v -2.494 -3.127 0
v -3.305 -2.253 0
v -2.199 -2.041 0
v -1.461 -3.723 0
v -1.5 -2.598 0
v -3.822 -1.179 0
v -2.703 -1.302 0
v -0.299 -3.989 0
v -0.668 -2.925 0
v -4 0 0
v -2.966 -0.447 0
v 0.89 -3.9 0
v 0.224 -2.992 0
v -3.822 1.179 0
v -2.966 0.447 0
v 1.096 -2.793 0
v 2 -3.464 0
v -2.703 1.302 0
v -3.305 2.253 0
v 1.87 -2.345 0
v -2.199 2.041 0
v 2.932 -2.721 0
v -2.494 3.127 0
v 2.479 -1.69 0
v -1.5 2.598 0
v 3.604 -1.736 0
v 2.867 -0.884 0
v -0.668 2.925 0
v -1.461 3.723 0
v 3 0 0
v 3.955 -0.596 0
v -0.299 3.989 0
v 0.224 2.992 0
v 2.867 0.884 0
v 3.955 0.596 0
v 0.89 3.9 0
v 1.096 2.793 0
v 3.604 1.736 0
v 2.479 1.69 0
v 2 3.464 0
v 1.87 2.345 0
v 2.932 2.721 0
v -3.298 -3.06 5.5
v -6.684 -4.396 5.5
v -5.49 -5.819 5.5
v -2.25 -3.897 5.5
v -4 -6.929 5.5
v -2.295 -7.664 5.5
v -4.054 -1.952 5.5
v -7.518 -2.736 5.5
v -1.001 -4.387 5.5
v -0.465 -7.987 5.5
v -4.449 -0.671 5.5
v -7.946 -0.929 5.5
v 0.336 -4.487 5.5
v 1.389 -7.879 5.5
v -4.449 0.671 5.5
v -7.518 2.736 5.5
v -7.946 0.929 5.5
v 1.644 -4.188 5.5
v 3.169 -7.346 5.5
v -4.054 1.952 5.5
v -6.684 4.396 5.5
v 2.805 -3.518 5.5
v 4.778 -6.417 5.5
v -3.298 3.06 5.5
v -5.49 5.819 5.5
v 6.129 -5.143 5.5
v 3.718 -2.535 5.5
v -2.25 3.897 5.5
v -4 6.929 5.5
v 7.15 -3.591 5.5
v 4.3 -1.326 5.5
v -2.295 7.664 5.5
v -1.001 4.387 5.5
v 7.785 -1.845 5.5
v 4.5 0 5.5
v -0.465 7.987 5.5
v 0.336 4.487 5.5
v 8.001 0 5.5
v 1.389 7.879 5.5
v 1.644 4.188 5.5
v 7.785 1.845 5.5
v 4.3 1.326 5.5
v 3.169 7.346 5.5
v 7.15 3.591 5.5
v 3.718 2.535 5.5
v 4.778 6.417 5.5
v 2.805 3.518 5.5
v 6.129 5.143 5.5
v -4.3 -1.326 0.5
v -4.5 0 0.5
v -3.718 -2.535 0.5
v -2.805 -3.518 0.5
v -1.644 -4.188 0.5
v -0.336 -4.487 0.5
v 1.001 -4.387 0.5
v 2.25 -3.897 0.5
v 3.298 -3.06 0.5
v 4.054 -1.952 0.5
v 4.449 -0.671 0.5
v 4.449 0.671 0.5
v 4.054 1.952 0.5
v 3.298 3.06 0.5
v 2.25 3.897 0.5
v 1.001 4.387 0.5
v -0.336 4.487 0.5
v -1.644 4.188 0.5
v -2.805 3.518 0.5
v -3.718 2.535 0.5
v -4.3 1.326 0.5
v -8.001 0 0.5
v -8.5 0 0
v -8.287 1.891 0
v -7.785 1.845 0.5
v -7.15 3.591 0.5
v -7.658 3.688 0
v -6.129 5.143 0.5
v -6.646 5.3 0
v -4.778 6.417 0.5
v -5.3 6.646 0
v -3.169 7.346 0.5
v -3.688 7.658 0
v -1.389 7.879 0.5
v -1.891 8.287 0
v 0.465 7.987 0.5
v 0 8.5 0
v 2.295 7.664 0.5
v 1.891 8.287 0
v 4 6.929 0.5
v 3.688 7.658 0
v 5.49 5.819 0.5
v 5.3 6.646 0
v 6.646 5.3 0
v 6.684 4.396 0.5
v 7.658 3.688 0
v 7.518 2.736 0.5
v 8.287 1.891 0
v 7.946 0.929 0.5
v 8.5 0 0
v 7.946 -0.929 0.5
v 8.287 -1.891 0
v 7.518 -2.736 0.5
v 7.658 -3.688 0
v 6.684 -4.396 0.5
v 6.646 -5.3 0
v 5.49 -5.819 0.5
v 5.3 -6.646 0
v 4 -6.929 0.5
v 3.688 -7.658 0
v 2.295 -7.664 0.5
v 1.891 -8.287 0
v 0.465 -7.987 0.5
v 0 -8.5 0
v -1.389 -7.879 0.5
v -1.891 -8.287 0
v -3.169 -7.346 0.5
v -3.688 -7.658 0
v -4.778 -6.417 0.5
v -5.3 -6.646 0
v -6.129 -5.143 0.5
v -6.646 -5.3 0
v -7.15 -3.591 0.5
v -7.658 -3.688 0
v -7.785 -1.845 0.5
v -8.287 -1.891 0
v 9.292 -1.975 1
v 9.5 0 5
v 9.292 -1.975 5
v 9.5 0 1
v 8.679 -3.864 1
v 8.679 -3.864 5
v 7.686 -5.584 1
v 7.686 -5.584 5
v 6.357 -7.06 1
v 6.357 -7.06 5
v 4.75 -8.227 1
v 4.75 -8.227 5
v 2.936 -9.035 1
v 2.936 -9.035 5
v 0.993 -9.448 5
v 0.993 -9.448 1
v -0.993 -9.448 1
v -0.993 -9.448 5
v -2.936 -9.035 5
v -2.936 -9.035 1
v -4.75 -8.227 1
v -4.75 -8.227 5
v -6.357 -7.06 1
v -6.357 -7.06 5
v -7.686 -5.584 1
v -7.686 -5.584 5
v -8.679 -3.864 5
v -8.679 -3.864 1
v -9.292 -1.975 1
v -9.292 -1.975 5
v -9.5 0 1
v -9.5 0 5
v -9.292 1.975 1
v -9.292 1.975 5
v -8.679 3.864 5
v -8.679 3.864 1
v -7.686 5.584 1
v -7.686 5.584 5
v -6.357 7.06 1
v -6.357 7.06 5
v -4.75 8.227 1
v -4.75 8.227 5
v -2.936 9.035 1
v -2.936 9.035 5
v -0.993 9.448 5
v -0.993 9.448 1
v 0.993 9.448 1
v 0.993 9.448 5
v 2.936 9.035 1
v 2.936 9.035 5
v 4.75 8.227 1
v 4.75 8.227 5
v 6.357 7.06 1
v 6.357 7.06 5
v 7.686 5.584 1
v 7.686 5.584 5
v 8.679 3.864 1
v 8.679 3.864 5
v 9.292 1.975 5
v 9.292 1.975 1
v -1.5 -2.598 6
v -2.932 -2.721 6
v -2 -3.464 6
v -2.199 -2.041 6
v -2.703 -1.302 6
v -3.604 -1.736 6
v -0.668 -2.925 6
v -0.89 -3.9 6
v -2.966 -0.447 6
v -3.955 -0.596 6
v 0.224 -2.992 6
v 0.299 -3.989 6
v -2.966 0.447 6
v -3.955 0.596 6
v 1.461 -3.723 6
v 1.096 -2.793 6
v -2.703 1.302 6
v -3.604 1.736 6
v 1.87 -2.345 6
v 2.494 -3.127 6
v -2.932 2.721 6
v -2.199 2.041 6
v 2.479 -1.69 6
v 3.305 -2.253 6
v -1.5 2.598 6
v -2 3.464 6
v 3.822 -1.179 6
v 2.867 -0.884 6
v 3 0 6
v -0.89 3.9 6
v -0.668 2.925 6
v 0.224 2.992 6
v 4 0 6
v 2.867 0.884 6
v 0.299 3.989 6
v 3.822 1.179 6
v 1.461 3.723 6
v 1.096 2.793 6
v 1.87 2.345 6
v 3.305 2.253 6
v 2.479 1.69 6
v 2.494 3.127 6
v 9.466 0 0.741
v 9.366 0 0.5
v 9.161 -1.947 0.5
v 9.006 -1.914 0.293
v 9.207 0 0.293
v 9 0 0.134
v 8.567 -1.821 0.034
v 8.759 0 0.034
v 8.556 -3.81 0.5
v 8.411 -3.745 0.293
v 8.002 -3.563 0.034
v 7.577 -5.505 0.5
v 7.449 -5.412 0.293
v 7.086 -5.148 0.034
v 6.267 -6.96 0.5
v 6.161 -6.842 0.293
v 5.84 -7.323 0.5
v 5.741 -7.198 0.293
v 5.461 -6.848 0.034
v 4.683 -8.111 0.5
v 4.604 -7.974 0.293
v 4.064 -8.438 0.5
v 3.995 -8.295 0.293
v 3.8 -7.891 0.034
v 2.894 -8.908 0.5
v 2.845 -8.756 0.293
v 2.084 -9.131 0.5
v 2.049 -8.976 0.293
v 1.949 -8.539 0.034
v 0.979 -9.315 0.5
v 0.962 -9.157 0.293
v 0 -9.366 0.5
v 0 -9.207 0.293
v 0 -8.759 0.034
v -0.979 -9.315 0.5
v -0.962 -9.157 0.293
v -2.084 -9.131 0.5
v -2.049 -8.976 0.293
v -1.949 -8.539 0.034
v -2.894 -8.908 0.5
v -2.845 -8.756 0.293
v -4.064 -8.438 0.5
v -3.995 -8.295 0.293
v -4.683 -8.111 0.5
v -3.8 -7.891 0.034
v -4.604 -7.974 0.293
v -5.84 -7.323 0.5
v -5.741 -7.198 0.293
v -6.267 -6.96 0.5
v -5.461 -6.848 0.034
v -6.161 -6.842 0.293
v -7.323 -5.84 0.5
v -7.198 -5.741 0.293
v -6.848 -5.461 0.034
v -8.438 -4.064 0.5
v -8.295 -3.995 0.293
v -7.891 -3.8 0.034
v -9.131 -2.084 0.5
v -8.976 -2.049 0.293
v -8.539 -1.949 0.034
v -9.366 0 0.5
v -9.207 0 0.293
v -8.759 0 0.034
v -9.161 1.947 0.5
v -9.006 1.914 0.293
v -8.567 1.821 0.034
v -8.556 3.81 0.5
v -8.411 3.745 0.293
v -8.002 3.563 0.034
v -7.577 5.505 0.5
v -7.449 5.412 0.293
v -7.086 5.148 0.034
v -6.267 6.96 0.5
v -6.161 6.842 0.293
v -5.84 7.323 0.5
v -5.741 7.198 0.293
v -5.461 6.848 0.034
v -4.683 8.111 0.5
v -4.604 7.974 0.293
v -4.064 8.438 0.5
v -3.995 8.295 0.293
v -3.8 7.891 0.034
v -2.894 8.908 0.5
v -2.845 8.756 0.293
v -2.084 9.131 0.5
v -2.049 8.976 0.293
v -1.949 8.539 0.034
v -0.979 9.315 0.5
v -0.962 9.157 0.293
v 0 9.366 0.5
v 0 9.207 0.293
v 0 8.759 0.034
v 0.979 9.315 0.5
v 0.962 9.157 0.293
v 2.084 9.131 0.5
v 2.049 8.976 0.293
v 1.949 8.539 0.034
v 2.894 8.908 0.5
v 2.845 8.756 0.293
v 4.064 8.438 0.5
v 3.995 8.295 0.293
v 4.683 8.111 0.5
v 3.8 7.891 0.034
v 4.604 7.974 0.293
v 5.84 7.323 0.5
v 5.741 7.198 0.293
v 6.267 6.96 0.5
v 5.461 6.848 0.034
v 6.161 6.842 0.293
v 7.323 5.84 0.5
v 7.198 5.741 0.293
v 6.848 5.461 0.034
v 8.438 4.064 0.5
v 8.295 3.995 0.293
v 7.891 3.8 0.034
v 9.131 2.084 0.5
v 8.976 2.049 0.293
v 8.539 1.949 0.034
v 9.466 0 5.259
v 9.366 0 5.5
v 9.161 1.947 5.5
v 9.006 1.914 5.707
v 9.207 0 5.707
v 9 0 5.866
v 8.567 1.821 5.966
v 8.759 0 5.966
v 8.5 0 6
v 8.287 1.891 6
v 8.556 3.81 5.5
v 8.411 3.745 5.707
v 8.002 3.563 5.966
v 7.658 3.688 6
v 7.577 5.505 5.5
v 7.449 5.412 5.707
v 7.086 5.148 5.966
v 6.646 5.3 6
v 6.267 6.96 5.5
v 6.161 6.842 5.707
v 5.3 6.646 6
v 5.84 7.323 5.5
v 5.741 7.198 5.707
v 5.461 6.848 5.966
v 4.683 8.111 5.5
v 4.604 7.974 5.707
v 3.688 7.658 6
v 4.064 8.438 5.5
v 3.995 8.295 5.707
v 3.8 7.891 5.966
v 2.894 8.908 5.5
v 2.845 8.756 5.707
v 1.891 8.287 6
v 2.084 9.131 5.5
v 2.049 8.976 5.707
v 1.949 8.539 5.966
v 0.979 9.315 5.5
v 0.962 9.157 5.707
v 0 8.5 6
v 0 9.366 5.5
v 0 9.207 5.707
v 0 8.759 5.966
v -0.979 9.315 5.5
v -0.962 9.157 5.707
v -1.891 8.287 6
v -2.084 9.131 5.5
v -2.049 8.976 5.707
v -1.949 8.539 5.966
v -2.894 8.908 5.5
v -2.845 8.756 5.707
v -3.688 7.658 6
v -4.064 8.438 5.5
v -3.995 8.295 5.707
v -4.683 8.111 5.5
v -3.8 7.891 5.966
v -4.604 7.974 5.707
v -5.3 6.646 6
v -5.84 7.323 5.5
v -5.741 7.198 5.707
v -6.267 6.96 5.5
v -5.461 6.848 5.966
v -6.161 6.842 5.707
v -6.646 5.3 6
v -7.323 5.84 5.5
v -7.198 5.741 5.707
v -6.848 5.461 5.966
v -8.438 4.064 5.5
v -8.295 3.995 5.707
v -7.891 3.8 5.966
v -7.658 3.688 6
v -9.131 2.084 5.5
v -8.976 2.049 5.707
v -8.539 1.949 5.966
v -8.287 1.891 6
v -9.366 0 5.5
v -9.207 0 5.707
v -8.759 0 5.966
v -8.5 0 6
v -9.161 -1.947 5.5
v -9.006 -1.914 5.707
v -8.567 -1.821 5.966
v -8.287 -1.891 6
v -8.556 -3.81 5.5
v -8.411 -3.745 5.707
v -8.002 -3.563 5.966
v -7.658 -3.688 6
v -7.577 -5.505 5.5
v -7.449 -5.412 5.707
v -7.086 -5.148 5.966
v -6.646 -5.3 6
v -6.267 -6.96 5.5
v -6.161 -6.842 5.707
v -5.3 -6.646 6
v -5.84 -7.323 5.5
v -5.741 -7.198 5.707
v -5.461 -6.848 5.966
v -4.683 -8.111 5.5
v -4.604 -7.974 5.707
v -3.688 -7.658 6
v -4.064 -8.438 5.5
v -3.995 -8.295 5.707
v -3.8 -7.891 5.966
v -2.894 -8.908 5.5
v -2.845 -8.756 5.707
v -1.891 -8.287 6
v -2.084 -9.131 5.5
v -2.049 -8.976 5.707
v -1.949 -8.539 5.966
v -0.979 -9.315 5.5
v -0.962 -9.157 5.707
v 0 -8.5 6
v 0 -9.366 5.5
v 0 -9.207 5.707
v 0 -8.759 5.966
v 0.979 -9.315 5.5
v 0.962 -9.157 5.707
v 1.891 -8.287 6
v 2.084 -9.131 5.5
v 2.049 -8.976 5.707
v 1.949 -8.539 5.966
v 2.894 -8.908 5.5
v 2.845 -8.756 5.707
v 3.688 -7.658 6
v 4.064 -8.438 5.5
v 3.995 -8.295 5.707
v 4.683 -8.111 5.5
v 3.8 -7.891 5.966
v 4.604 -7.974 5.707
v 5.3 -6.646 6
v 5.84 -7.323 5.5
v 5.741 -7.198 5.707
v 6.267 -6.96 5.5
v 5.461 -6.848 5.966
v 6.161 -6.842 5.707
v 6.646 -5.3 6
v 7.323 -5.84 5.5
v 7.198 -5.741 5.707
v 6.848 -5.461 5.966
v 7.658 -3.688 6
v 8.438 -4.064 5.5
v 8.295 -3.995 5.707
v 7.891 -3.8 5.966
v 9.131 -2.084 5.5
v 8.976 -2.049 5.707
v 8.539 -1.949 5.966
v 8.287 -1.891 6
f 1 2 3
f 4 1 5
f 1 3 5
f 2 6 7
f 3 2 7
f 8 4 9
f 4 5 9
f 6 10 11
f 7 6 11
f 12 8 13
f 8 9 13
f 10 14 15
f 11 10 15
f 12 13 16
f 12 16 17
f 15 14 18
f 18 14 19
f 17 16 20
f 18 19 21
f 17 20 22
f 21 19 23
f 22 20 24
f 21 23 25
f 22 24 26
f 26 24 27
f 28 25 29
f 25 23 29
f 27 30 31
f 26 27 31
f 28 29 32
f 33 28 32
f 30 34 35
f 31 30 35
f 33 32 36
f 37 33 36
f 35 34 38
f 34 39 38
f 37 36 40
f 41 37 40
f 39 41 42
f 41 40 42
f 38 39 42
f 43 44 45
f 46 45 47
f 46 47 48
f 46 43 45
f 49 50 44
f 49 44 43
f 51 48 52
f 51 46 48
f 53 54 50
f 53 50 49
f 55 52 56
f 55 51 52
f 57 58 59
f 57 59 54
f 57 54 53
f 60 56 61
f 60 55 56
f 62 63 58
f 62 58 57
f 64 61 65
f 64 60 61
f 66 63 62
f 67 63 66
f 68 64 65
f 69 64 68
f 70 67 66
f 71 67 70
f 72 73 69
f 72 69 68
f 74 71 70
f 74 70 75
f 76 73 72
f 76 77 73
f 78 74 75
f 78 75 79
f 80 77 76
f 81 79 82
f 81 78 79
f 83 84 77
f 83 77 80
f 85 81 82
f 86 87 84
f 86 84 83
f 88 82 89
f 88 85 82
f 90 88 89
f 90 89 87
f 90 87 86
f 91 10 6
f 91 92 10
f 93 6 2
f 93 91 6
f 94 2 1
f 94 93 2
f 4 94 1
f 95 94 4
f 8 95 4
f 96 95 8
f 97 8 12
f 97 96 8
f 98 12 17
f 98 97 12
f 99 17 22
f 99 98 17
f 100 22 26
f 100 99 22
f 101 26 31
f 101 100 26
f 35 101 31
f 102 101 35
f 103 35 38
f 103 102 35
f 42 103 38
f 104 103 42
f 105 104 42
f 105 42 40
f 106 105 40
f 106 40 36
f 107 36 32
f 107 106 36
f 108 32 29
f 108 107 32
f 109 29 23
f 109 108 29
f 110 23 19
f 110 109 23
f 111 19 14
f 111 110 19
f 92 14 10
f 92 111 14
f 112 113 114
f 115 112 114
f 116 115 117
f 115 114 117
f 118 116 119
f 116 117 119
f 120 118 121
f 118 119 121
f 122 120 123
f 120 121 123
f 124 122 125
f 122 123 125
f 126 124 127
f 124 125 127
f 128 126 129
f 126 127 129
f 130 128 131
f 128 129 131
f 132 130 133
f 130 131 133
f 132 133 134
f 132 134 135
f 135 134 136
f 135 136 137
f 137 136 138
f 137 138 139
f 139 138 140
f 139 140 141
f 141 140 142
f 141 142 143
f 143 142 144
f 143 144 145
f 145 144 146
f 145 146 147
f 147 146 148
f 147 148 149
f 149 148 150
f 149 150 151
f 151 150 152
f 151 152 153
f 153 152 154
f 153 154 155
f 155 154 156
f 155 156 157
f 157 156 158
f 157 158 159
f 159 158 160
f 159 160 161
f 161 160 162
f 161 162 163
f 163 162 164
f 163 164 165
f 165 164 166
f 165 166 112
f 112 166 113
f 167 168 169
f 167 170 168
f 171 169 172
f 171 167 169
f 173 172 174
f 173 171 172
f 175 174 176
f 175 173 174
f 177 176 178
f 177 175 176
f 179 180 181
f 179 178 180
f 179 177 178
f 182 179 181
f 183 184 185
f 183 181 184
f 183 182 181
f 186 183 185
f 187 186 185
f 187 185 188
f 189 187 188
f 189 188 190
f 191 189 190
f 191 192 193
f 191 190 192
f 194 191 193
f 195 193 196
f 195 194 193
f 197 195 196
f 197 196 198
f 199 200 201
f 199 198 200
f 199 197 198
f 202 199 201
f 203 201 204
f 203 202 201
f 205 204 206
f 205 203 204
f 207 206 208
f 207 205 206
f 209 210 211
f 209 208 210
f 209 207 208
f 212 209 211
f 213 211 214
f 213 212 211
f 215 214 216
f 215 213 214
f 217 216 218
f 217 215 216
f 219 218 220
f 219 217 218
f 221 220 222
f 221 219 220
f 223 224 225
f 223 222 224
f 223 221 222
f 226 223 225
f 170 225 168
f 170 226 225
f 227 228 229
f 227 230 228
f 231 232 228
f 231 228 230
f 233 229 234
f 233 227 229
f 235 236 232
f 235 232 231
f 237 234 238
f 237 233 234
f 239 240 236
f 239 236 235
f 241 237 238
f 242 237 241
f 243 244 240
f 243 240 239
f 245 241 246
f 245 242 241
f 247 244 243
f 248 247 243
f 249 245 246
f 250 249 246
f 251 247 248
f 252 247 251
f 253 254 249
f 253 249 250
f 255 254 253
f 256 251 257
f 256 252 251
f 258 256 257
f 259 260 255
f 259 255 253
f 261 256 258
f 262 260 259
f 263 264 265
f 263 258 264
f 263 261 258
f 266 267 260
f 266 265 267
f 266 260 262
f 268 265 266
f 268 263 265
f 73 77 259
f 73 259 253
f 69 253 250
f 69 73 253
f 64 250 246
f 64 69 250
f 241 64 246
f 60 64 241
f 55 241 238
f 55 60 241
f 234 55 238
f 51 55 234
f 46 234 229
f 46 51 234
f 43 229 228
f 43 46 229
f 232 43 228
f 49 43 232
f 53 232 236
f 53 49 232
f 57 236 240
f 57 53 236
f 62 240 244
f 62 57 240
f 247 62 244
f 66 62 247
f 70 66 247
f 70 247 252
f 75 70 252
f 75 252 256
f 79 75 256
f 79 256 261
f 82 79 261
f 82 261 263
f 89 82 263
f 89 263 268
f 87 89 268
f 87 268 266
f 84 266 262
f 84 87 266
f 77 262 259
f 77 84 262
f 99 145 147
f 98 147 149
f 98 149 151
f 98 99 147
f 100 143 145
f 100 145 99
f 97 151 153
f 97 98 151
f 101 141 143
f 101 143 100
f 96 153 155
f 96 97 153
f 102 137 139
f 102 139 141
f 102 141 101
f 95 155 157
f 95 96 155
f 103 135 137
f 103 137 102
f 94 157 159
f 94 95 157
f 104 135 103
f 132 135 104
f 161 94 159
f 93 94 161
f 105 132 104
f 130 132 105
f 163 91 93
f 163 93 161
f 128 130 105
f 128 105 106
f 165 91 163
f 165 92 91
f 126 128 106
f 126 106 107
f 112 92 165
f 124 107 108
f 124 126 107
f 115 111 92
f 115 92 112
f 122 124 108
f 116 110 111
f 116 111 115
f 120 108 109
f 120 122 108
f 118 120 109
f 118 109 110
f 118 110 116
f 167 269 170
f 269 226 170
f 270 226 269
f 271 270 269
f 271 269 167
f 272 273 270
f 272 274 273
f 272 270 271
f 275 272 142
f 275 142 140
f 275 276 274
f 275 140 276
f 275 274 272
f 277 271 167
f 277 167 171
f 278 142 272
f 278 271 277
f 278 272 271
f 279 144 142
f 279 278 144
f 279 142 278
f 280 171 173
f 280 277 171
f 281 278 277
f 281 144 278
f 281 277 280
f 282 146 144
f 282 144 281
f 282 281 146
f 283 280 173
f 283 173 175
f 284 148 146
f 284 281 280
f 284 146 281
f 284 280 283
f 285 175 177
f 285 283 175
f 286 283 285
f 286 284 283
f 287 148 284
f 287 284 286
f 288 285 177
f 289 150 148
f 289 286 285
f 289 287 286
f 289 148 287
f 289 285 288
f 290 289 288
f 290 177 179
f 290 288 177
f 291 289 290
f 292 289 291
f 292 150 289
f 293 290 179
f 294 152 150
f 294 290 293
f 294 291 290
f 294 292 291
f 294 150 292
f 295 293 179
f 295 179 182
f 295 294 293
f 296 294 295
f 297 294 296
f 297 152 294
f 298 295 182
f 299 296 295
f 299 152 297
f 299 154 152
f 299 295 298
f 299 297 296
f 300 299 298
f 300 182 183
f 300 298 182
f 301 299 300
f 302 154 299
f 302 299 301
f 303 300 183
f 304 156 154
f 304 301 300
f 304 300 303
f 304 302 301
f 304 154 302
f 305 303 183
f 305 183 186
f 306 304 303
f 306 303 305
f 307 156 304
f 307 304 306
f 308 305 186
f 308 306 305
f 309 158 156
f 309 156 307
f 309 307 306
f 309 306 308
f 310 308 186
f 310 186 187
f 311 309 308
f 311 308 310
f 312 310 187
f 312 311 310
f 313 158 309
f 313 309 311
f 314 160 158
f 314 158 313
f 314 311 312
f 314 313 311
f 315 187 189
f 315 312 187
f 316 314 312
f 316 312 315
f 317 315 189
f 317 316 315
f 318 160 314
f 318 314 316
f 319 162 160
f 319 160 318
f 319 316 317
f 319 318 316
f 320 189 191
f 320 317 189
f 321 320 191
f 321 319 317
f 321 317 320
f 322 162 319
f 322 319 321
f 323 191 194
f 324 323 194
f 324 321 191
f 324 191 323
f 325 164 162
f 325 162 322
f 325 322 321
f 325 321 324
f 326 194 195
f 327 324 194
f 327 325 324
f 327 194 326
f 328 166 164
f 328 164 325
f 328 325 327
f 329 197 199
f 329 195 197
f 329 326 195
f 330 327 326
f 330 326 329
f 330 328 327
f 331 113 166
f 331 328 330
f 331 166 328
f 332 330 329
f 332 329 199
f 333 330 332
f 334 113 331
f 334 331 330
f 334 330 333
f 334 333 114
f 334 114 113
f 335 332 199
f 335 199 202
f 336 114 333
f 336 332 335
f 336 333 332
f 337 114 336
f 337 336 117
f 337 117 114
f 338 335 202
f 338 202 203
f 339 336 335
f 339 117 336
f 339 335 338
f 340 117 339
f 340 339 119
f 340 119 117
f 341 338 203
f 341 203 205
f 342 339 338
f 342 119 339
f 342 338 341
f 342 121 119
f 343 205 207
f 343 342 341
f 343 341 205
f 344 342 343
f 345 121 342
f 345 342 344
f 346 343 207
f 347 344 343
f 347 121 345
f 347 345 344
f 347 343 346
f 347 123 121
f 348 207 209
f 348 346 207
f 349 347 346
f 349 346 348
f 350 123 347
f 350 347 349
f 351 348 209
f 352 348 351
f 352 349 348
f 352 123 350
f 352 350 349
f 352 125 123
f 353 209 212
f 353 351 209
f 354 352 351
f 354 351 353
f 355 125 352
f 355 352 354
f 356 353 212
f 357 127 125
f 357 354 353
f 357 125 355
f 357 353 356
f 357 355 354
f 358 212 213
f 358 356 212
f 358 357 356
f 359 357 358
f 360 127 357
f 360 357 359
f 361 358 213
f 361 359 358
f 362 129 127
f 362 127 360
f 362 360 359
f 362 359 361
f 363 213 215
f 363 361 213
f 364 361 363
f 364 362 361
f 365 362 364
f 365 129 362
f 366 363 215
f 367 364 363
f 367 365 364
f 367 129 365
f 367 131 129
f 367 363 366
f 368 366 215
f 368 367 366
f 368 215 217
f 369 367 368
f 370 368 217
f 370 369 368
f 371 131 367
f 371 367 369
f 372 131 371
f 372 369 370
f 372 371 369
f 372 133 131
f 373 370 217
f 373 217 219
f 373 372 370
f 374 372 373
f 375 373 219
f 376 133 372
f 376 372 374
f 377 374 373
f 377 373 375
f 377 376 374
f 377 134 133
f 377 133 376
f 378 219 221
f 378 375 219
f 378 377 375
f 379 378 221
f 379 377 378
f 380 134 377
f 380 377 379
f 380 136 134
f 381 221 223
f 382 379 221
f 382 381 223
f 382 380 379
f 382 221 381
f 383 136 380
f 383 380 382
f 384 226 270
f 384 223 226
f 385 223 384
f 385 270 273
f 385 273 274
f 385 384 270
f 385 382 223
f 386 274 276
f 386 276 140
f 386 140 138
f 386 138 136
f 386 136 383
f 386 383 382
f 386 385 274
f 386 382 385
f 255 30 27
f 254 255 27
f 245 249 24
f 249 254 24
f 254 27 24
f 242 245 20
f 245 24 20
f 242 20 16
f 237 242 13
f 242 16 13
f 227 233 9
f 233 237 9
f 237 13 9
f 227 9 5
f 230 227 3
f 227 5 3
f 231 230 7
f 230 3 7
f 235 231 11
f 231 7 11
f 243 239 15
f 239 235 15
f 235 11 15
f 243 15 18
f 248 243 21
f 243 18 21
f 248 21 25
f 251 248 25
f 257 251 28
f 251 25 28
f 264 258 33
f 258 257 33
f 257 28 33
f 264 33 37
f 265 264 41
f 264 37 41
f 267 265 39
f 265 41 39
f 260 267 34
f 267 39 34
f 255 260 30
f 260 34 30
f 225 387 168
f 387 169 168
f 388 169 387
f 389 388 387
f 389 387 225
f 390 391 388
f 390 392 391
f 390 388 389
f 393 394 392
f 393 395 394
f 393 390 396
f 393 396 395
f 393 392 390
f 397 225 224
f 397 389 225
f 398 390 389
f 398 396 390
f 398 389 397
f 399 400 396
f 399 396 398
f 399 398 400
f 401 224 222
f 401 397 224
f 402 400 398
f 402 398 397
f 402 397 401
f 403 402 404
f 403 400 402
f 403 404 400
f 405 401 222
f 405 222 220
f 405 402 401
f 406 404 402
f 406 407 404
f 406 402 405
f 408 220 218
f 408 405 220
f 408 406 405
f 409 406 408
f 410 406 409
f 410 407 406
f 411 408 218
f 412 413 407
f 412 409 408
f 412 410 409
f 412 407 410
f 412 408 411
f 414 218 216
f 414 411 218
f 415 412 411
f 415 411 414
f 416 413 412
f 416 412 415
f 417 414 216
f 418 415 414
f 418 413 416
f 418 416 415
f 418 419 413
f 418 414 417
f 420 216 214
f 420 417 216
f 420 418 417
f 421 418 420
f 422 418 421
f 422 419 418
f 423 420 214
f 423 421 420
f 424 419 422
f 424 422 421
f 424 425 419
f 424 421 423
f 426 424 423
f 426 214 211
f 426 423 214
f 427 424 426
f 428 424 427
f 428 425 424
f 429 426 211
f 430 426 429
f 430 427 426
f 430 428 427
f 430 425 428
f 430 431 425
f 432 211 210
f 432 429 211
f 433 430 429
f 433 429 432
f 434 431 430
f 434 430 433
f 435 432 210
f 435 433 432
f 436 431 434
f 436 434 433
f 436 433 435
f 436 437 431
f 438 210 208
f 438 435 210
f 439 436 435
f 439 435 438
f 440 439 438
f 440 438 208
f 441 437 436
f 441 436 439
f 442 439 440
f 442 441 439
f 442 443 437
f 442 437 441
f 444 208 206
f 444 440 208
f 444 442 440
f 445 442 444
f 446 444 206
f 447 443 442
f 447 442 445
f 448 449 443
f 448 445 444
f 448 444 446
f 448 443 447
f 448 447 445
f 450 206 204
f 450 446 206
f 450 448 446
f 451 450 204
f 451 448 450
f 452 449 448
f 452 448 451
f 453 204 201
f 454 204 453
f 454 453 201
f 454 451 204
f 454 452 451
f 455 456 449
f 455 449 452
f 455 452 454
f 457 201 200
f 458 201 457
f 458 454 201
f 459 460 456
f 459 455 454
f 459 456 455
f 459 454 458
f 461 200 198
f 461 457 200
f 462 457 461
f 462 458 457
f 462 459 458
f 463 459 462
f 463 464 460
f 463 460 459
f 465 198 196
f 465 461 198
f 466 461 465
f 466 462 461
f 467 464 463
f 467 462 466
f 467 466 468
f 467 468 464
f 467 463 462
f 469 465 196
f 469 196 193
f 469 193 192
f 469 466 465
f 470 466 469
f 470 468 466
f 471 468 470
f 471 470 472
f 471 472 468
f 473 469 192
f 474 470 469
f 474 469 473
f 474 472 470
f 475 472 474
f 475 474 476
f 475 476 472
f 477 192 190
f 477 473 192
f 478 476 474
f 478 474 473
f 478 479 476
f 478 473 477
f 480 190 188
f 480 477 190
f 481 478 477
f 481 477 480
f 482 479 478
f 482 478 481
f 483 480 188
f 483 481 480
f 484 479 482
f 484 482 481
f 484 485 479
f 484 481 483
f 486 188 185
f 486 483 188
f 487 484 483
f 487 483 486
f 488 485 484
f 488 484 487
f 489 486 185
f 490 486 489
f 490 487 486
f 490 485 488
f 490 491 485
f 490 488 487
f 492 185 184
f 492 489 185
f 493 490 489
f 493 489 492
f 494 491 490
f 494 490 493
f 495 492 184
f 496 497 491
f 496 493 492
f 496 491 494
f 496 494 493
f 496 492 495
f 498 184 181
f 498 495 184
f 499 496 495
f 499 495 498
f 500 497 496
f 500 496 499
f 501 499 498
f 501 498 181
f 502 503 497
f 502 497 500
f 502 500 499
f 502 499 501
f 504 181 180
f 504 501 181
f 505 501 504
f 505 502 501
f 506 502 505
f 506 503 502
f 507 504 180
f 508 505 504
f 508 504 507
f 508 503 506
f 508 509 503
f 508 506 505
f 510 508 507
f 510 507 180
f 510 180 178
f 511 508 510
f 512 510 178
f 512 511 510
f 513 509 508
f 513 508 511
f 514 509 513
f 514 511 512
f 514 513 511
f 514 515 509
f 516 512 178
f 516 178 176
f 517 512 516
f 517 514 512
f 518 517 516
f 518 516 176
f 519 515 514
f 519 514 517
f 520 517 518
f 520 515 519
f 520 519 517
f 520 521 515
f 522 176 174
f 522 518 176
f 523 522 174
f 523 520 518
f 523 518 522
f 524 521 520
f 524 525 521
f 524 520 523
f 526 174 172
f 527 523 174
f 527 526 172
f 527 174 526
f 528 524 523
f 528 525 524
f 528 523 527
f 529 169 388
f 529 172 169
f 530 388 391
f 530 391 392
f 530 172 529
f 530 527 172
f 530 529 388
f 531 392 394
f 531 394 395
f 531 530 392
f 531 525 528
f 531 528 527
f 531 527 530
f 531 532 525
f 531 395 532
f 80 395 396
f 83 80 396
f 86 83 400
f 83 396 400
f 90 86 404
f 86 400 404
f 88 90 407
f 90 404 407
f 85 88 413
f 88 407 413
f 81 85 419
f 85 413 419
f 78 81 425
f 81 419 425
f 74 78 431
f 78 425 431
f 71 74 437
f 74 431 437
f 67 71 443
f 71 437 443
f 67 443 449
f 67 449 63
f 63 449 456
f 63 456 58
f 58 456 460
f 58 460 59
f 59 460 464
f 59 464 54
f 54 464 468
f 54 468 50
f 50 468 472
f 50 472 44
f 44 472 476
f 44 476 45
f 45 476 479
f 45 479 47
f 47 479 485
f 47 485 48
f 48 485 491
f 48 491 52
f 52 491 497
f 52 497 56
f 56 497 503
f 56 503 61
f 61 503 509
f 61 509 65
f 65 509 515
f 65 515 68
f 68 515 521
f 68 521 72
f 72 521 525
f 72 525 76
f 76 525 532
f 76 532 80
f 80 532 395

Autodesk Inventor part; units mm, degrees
ref_plane "YZ Plane" through (0, 0, 0) normal (1, 0, 0) x (0, 1, 0)
ref_plane "XZ Plane" through (0, 0, 0) normal (0, 1, 0) x (-1, 0, 0)
ref_plane "XY Plane" through (0, 0, 0) normal (0, 0, 1) x (1, 0, 0)
sketch "Esquisse1" plane through (0, 0, 0) normal (0, 0, 1) x (1, 0, 0)
  circle A0 centre (0, 0) radius 9.5
  circle A1 centre (0, 0) radius 3
  dimension "d0" = 6
  dimension "d1" = 19
extrude "Extrusion1" add sketch "Esquisse1" along normal blind 6
fillet "Congé1" radius 1 2 edges at (-9.5, 0, 6) (-9.5, 0, 0)
sketch "Esquisse2" plane through (0, 0, 6) normal (0, 0, 1) x (1, 0, 0)
  circle A0 centre (0, 0) radius 4
  circle A1 centre (0, 0) radius 8.5
  dimension "d5" = 8
  dimension "d6" = 17
extrude "Extrusion2" cut sketch "Esquisse2" against normal blind 0.5
sketch "Esquisse3" plane through (0, 0, 0) normal (0, 0, -1) x (-1, 0, 0)
  circle A0 centre (0, 0) radius 4
  circle A1 centre (0, 0) radius 8.5
extrude "Extrusion3" cut sketch "Esquisse3" against normal blind 0.5
chamfer "Chanfrein3" distance 0.5 angle 45 2 edges at (-4, 0, 5.5) (-8.5, 0, 5.5)
chamfer "Chanfrein4" distance 0.5 angle 45 2 edges at (8.5, 0, 0.5) (4, 0, 0.5)
properties part number "Roulement"
